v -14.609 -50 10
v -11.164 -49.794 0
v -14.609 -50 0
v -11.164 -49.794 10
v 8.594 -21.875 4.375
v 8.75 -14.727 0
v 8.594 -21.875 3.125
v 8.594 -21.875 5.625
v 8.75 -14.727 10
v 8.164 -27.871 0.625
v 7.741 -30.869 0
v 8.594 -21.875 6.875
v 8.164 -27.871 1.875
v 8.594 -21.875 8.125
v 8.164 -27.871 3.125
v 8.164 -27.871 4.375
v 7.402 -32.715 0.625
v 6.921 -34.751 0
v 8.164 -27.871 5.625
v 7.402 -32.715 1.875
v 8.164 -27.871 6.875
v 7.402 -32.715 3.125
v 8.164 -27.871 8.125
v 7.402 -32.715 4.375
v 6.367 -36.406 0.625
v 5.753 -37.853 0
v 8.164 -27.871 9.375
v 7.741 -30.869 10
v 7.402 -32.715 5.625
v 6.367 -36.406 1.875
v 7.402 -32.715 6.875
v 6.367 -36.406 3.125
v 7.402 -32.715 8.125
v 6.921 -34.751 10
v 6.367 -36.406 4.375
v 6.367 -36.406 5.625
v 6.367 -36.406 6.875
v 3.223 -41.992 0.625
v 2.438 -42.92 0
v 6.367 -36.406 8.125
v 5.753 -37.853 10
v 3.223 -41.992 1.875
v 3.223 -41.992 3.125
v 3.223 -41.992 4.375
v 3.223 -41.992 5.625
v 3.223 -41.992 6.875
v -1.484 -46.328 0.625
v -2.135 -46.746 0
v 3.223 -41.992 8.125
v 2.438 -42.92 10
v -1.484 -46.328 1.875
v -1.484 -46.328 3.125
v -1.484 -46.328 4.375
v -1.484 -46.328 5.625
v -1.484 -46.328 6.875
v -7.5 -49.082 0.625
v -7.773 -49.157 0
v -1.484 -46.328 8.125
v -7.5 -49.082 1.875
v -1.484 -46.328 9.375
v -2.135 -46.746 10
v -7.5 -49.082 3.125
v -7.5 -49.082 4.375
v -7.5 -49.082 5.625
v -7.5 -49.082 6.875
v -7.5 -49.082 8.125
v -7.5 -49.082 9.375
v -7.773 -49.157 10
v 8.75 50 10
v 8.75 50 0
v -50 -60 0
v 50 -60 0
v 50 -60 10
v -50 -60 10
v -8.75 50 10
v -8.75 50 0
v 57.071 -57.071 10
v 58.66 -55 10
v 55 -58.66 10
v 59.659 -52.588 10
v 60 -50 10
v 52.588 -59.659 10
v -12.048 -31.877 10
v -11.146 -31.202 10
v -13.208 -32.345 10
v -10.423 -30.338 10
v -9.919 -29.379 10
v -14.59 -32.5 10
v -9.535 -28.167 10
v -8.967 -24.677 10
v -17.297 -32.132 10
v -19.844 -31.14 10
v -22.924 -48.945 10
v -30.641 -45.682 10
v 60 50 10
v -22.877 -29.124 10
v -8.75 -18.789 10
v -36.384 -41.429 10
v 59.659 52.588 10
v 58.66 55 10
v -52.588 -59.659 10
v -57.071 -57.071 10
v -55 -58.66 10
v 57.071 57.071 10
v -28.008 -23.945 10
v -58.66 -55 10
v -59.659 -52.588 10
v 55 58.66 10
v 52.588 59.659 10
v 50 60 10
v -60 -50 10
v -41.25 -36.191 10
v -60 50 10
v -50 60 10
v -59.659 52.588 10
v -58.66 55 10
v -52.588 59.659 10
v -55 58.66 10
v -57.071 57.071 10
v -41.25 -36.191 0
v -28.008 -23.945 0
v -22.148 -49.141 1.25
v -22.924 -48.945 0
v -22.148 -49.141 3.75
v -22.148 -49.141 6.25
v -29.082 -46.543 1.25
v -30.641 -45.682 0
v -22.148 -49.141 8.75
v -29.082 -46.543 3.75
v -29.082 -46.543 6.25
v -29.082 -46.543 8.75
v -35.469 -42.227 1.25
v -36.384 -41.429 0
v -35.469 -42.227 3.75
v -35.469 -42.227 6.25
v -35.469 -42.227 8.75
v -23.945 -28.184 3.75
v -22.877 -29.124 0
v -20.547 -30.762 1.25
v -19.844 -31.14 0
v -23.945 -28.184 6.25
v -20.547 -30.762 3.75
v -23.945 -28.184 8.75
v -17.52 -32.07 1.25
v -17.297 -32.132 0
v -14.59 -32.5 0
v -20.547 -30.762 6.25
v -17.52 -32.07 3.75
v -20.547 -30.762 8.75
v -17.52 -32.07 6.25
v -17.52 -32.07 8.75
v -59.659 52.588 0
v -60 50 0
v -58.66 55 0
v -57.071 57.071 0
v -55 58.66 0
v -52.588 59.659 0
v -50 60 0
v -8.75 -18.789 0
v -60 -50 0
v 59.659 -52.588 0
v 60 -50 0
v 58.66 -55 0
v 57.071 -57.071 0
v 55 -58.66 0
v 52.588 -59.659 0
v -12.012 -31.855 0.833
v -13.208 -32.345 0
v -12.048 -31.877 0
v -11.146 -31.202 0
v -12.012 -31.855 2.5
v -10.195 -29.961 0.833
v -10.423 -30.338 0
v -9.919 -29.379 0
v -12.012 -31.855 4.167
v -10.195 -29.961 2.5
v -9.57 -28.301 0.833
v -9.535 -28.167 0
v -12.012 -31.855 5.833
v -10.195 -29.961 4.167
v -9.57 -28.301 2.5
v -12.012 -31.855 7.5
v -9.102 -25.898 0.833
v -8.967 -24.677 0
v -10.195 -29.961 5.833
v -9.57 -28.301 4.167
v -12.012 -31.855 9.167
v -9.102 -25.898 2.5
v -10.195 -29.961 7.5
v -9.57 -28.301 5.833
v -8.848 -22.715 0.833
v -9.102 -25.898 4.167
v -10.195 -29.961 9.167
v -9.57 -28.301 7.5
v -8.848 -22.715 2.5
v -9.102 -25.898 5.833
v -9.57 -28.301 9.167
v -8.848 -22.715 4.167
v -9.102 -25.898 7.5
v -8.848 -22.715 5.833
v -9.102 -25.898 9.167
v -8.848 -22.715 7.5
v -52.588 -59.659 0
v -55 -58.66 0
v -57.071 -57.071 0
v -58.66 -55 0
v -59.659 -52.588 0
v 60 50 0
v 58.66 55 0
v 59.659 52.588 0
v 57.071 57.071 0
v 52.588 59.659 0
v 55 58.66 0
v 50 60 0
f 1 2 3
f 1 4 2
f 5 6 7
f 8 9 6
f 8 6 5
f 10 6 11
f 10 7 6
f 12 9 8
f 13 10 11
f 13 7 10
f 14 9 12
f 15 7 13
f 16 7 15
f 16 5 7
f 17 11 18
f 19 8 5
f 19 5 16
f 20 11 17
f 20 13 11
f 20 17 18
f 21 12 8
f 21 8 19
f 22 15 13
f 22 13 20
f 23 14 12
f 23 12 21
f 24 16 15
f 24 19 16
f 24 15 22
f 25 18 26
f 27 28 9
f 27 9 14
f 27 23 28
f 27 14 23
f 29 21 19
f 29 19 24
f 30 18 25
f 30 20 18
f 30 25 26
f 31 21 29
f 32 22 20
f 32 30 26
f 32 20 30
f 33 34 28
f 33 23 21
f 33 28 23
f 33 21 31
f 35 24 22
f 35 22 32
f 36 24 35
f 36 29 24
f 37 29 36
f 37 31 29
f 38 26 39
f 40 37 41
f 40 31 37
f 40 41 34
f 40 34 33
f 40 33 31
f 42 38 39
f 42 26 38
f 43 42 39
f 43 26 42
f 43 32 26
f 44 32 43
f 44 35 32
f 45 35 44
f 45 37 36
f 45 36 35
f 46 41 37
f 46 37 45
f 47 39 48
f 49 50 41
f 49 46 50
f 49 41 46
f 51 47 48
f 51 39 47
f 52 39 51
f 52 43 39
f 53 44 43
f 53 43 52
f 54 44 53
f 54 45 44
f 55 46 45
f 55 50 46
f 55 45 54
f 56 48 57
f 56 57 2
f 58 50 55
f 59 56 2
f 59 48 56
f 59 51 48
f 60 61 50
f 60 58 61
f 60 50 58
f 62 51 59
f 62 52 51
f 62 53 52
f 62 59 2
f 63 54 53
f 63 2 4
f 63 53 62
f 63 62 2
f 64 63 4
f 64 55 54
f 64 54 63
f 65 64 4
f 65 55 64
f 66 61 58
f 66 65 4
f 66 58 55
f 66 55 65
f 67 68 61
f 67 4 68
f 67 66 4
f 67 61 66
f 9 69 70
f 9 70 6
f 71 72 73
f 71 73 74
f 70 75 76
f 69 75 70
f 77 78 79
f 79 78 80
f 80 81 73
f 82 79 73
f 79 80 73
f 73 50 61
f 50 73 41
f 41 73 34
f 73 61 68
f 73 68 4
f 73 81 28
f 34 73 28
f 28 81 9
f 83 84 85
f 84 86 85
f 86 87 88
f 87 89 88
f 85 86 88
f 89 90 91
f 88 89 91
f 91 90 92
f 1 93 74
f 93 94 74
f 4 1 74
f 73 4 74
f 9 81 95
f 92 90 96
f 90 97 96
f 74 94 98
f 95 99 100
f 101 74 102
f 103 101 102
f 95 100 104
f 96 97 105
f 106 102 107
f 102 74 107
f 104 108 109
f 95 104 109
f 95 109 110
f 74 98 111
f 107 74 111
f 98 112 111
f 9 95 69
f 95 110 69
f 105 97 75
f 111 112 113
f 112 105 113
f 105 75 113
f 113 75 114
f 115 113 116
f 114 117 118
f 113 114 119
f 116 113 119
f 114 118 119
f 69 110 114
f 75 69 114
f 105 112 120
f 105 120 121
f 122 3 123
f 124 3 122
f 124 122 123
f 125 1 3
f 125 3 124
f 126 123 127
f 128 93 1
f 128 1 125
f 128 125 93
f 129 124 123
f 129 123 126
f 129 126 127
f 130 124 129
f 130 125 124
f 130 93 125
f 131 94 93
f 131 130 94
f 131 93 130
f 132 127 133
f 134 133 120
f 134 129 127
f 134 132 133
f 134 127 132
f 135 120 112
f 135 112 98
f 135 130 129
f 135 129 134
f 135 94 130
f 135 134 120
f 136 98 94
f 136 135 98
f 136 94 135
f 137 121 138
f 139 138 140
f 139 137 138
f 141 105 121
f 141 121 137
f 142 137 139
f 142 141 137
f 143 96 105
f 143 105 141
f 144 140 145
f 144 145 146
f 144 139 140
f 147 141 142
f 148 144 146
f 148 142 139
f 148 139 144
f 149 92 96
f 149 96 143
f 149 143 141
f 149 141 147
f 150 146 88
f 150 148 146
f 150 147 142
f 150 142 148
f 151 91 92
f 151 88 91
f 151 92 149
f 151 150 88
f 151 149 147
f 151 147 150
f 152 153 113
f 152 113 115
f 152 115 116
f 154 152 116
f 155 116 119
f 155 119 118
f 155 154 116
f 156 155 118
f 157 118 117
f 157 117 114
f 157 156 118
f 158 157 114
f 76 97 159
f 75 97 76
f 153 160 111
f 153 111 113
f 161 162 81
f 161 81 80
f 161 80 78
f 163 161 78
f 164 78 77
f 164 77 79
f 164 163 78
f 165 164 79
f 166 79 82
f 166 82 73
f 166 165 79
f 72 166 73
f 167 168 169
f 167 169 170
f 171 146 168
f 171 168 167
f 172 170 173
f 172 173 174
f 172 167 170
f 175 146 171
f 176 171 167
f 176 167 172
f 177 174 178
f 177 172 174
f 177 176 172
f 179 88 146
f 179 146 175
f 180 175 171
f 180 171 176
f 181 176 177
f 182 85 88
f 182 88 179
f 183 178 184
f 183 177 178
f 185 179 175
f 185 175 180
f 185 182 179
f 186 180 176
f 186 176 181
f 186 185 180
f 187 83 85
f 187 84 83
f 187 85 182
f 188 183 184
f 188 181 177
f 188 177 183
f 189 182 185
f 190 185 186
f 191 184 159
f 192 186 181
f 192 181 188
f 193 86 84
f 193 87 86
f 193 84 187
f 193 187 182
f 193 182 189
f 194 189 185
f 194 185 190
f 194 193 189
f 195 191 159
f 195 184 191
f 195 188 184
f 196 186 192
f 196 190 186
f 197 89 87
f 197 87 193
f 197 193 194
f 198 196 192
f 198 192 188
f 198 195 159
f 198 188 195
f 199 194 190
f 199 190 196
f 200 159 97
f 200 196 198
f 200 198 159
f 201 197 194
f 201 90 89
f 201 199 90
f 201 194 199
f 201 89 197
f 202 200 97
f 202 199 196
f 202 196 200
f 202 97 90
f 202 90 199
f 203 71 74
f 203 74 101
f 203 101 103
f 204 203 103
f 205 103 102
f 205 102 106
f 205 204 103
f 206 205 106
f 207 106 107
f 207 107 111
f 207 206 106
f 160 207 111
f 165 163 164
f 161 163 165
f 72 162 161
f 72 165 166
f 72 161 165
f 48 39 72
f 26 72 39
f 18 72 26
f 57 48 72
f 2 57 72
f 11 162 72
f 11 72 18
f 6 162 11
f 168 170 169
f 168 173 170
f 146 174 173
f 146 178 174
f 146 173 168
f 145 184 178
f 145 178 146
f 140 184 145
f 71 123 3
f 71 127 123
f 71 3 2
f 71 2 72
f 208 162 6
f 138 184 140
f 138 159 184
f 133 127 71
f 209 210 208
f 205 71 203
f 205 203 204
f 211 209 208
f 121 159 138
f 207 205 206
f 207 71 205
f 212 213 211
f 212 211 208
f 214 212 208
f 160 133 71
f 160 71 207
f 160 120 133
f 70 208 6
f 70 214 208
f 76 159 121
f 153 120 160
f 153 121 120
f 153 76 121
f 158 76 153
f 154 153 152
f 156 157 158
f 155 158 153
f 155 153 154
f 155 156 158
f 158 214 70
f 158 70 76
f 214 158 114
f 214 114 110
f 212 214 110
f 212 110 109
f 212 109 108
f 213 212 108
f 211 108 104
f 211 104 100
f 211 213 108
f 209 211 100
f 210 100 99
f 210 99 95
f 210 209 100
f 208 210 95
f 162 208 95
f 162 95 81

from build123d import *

# Parameters (mm, degrees)
BOSS_EXTRUDE1_DEPTH = 10
CUT_EXTRUDE23_DEPTH = 10


with BuildPart() as part:
    # Sketch1 → Boss-Extrude1 (new body)
    with BuildSketch(Plane.XY):
        with BuildLine():
            Line((-50, 60), (50, 60))
            ThreePointArc((50, 60), (57.071067812, 57.071067812), (60, 50))
            Line((60, 50), (60, -50))
            ThreePointArc((60, -50), (57.071067812, -57.071067812), (50, -60))
            Line((50, -60), (-50, -60))
            ThreePointArc((-50, -60), (-57.071067812, -57.071067812), (-60, -50))
            Line((-60, -50), (-60, 50))
            ThreePointArc((-60, 50), (-57.071067812, 57.071067812), (-50, 60))
        make_face()
    extrude(amount=BOSS_EXTRUDE1_DEPTH)

    # Sketch2 → Cut-Extrude23 (cut)
    with BuildSketch(Plane.XY.offset(10)):
        with BuildLine():
            Line((-8.75, 50), (8.75, 50))
            Line((8.75, 50), (8.75, -14.7265625))
            add(Edge.make_bspline(
                [(8.75, -14.7265625), (8.743583975, -15.963662149), (8.731221561, -18.347308928), (8.60745187, -21.778880386), (8.440093422, -24.925119282), (8.199081109, -27.780984325), (7.841111838, -30.346337414), (7.435999316, -32.627578869), (6.989047753, -34.634004111), (6.23403689, -36.879506107), (5.061904404, -39.366144137), (3.293123023, -42.05206658), (1.090424054, -44.385675502), (-1.446357574, -46.412684578), (-4.338596124, -48.017692334), (-7.51966122, -49.177796237), (-10.979383755, -49.870850344), (-13.375676653, -49.956106859), (-14.609375, -50)],
                knots=[0, 0, 0, 0, 1.22248561, 2.355488409, 3.392943897, 4.335991845, 5.186735882, 5.951517034, 6.625683685, 7.215700098, 8.28923535, 9.333114649, 10.380102123, 11.447198135, 12.530158036, 13.633358744, 14.781567393, 16, 16, 16, 16], degree=3))
            add(Edge.make_bspline(
                [(-14.609375, -50), (-15.894776413, -49.960205451), (-18.430089946, -49.88171506), (-22.148388349, -49.2131785), (-25.722137923, -48.141313235), (-29.13284997, -46.591524706), (-32.427252281, -44.650205179), (-35.545554474, -42.242187263), (-38.552862415, -39.442154155), (-40.33561292, -37.293479019), (-41.25, -36.19140625)],
                knots=[0, 0, 0, 0, 0.990984786, 1.954608977, 2.90473533, 3.862451285, 4.837525908, 5.848096122, 6.896271184, 8, 8, 8, 8], degree=3))
            Line((-41.25, -36.19140625), (-28.0078125, -23.9453125))
            add(Edge.make_bspline(
                [(-28.0078125, -23.9453125), (-27.314466509, -24.729291012), (-26.01702976, -26.196325573), (-24.061830829, -28.109374669), (-22.298136041, -29.64628881), (-20.635555645, -30.75487882), (-19.06661841, -31.53631102), (-17.557567552, -32.099198603), (-16.061363785, -32.417824942), (-15.072925956, -32.473022924), (-14.58984375, -32.5)],
                knots=[0, 0, 0, 0, 1.529509877, 2.862124173, 3.996688592, 4.944357383, 5.774364335, 6.554177287, 7.293378699, 8, 8, 8, 8], degree=3))
            add(Edge.make_bspline(
                [(-14.58984375, -32.5), (-14.122273945, -32.475616988), (-13.223290925, -32.428736471), (-11.987154797, -31.907600104), (-10.945012492, -31.089394098), (-10.25892751, -30.148760123), (-9.821709802, -29.187178965), (-9.548527937, -28.257662954), (-9.289277875, -27.143425185), (-9.081572506, -25.845024103), (-8.924629957, -24.345523841), (-8.846405442, -22.663128248), (-8.751274399, -20.78874592), (-8.750439906, -19.479327194), (-8.75, -18.7890625)],
                knots=[0, 0, 0, 0, 1.003927327, 1.930222208, 2.840933547, 3.835773585, 4.407906147, 5.114514582, 5.922289074, 6.876303333, 7.950072246, 9.174518422, 10.510537432, 12, 12, 12, 12], degree=3))
            Line((-8.75, -18.7890625), (-8.75, 50))
        make_face()
    extrude(amount=-CUT_EXTRUDE23_DEPTH, mode=Mode.SUBTRACT)


solid = part.part
